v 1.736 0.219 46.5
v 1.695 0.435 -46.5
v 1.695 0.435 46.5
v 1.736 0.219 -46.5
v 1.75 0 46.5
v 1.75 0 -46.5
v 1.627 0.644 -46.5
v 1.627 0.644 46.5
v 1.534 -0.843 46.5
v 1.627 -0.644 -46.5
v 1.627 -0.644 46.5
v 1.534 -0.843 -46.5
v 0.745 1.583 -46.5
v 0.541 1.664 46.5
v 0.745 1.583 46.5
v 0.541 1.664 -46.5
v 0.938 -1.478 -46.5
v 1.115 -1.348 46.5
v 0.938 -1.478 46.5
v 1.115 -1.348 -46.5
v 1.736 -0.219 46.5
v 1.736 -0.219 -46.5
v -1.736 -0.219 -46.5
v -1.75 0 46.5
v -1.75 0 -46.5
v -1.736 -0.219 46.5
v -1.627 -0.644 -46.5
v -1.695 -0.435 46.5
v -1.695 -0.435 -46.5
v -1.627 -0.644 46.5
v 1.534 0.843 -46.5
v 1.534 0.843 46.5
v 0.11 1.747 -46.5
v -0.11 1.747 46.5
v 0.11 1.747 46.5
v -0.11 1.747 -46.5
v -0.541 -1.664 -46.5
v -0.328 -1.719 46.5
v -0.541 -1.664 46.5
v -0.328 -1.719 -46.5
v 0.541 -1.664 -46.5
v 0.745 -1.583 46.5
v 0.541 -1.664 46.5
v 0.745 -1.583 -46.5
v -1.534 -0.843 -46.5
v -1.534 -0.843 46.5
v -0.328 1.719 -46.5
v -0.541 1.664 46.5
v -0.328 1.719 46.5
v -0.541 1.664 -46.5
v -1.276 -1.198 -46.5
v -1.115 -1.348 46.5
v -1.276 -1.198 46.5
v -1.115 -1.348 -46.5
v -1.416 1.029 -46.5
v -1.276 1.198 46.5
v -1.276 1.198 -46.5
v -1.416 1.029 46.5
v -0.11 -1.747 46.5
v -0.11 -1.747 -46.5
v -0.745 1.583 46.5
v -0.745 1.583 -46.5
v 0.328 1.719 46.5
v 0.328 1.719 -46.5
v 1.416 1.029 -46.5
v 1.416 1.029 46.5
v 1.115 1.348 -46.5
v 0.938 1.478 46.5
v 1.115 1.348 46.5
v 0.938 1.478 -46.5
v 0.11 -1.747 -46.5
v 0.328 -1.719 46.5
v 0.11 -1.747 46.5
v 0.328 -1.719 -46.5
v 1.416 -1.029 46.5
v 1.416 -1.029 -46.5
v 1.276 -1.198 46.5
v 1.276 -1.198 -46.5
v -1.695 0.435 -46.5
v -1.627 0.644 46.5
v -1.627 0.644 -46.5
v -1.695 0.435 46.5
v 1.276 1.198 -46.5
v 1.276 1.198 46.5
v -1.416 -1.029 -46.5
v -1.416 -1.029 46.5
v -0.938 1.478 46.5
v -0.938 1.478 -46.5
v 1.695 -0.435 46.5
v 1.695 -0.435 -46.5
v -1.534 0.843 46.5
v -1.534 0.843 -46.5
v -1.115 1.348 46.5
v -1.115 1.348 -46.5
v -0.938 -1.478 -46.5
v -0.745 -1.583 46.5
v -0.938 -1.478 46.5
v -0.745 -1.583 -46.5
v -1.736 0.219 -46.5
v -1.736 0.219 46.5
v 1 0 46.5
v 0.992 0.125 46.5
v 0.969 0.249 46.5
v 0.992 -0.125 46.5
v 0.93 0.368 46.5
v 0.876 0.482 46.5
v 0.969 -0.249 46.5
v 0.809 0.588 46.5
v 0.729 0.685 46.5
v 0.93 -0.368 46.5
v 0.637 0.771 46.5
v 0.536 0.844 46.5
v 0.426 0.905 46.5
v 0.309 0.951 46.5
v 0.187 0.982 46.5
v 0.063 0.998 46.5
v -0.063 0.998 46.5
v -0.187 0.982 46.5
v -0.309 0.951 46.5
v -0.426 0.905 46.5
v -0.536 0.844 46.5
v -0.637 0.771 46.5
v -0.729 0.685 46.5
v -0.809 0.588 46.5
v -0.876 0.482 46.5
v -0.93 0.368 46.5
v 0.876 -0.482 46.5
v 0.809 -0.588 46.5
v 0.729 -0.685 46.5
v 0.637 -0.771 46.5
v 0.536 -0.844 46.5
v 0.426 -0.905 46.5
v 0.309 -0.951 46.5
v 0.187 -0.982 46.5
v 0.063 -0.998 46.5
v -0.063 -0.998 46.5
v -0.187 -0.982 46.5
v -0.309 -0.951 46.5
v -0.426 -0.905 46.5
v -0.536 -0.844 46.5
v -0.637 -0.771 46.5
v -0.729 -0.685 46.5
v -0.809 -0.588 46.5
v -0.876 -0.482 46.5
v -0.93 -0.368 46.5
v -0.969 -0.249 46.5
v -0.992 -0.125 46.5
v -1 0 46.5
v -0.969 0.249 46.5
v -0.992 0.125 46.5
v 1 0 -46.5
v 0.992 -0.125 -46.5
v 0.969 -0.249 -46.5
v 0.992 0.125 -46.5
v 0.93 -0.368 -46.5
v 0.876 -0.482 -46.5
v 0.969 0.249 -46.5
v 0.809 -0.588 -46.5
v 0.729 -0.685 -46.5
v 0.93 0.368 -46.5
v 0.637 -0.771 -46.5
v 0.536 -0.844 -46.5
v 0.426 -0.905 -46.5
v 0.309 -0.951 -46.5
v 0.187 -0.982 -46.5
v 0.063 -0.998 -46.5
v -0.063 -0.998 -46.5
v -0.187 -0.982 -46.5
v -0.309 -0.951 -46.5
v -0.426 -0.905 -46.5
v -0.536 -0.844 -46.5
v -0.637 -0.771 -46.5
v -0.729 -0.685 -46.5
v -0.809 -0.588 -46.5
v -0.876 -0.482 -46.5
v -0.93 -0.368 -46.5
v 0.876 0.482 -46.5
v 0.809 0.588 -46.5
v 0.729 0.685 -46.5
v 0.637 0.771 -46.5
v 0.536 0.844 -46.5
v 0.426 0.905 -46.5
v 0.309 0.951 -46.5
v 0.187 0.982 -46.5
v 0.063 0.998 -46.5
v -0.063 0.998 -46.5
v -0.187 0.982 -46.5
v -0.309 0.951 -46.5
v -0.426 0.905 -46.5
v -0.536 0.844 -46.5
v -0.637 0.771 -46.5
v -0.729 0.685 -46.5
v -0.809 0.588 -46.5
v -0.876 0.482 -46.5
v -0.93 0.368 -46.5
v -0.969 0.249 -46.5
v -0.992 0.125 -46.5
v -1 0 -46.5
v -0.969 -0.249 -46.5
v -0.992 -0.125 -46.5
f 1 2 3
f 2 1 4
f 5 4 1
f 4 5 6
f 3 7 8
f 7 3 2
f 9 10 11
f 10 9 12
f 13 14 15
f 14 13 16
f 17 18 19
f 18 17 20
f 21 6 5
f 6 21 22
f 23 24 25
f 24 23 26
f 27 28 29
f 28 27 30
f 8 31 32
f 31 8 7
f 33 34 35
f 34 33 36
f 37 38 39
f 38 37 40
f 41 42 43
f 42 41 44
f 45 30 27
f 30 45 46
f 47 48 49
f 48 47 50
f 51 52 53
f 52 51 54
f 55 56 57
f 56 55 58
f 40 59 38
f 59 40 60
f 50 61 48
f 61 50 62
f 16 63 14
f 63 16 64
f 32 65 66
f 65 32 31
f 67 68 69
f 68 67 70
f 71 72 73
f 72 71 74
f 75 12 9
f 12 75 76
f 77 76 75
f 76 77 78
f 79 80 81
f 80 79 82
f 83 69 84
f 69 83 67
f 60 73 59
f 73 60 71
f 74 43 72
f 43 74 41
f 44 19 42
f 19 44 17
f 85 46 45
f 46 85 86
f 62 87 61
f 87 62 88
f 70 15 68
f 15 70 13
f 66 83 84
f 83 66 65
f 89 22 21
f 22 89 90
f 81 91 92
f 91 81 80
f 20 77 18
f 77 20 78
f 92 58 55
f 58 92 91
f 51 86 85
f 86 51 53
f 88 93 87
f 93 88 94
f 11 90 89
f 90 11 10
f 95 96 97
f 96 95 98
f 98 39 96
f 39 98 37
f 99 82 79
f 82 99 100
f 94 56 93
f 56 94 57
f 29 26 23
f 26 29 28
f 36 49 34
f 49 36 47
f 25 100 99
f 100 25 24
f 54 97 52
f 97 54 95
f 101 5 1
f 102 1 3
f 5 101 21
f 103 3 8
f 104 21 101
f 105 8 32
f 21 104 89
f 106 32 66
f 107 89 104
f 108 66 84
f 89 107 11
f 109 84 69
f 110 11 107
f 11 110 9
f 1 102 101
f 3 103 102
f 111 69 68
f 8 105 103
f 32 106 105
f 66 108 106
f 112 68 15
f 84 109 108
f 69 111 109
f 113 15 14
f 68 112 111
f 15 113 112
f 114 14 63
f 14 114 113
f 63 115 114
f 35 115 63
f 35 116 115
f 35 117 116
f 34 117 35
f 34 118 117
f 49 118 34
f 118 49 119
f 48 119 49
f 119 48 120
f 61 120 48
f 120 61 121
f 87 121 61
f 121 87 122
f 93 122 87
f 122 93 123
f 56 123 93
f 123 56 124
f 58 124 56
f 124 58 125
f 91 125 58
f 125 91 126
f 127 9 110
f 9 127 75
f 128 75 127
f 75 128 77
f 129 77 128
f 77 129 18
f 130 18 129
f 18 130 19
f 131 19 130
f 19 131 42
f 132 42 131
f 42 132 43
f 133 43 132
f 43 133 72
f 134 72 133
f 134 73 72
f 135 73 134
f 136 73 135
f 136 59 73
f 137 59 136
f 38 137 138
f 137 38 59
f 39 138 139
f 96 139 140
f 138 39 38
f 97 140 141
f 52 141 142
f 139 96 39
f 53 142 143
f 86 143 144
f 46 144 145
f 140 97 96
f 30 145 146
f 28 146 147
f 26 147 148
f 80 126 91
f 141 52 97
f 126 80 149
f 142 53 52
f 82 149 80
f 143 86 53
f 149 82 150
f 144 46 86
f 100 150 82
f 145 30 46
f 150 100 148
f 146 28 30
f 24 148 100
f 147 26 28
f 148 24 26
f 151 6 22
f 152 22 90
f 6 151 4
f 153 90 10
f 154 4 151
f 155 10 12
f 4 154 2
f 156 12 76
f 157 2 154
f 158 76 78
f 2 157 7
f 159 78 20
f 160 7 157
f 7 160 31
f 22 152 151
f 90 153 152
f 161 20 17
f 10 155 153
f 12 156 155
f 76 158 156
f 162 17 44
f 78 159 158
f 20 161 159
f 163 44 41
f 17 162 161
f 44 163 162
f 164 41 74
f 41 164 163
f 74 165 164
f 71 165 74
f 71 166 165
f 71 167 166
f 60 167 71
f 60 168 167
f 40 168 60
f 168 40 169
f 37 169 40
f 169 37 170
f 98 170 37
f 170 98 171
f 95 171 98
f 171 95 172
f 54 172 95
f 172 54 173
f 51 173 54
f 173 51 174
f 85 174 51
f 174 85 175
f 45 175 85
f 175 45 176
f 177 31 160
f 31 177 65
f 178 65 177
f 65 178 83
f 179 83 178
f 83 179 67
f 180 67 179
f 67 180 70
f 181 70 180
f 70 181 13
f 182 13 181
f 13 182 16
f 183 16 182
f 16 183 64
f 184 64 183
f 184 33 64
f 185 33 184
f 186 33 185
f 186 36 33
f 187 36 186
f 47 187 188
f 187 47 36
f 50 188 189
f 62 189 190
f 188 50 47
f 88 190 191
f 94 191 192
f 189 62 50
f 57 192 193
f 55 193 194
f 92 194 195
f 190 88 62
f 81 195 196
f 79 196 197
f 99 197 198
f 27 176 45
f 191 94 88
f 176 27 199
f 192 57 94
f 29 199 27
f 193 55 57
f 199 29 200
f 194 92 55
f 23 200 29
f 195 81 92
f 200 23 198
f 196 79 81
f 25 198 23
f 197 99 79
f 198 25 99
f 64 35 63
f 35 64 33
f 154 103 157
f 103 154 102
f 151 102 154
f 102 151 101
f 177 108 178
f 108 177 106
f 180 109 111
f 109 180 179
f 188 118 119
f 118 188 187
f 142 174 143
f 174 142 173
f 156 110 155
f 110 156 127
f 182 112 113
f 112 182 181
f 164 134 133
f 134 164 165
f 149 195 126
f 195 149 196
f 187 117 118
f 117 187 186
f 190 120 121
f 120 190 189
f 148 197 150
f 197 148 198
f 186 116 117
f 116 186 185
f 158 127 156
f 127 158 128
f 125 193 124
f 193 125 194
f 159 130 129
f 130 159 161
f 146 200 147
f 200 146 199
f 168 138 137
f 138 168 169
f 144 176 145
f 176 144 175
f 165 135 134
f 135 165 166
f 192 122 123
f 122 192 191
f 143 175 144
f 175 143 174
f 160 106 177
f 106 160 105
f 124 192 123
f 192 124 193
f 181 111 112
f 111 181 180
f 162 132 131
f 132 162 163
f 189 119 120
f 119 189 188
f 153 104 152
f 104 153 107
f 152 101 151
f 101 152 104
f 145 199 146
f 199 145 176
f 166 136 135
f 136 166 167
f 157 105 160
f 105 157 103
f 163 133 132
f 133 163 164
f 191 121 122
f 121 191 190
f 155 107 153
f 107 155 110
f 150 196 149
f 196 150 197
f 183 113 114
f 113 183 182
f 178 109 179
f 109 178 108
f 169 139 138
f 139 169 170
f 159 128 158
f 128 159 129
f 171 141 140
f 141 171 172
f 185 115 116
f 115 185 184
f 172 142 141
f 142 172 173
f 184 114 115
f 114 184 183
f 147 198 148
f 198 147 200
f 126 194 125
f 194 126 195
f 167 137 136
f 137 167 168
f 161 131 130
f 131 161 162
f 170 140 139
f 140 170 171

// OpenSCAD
$fn = 50;


difference() {
	union() {
		translate(v = [0, 0, -46.5000000000]) {
			cylinder(h = 93, r = 1.7500000000);
		}
	}
	union() {
		translate(v = [0, 0, -100.0000000000]) {
			cylinder(h = 200, r = 1.0000000000);
		}
	}
}
